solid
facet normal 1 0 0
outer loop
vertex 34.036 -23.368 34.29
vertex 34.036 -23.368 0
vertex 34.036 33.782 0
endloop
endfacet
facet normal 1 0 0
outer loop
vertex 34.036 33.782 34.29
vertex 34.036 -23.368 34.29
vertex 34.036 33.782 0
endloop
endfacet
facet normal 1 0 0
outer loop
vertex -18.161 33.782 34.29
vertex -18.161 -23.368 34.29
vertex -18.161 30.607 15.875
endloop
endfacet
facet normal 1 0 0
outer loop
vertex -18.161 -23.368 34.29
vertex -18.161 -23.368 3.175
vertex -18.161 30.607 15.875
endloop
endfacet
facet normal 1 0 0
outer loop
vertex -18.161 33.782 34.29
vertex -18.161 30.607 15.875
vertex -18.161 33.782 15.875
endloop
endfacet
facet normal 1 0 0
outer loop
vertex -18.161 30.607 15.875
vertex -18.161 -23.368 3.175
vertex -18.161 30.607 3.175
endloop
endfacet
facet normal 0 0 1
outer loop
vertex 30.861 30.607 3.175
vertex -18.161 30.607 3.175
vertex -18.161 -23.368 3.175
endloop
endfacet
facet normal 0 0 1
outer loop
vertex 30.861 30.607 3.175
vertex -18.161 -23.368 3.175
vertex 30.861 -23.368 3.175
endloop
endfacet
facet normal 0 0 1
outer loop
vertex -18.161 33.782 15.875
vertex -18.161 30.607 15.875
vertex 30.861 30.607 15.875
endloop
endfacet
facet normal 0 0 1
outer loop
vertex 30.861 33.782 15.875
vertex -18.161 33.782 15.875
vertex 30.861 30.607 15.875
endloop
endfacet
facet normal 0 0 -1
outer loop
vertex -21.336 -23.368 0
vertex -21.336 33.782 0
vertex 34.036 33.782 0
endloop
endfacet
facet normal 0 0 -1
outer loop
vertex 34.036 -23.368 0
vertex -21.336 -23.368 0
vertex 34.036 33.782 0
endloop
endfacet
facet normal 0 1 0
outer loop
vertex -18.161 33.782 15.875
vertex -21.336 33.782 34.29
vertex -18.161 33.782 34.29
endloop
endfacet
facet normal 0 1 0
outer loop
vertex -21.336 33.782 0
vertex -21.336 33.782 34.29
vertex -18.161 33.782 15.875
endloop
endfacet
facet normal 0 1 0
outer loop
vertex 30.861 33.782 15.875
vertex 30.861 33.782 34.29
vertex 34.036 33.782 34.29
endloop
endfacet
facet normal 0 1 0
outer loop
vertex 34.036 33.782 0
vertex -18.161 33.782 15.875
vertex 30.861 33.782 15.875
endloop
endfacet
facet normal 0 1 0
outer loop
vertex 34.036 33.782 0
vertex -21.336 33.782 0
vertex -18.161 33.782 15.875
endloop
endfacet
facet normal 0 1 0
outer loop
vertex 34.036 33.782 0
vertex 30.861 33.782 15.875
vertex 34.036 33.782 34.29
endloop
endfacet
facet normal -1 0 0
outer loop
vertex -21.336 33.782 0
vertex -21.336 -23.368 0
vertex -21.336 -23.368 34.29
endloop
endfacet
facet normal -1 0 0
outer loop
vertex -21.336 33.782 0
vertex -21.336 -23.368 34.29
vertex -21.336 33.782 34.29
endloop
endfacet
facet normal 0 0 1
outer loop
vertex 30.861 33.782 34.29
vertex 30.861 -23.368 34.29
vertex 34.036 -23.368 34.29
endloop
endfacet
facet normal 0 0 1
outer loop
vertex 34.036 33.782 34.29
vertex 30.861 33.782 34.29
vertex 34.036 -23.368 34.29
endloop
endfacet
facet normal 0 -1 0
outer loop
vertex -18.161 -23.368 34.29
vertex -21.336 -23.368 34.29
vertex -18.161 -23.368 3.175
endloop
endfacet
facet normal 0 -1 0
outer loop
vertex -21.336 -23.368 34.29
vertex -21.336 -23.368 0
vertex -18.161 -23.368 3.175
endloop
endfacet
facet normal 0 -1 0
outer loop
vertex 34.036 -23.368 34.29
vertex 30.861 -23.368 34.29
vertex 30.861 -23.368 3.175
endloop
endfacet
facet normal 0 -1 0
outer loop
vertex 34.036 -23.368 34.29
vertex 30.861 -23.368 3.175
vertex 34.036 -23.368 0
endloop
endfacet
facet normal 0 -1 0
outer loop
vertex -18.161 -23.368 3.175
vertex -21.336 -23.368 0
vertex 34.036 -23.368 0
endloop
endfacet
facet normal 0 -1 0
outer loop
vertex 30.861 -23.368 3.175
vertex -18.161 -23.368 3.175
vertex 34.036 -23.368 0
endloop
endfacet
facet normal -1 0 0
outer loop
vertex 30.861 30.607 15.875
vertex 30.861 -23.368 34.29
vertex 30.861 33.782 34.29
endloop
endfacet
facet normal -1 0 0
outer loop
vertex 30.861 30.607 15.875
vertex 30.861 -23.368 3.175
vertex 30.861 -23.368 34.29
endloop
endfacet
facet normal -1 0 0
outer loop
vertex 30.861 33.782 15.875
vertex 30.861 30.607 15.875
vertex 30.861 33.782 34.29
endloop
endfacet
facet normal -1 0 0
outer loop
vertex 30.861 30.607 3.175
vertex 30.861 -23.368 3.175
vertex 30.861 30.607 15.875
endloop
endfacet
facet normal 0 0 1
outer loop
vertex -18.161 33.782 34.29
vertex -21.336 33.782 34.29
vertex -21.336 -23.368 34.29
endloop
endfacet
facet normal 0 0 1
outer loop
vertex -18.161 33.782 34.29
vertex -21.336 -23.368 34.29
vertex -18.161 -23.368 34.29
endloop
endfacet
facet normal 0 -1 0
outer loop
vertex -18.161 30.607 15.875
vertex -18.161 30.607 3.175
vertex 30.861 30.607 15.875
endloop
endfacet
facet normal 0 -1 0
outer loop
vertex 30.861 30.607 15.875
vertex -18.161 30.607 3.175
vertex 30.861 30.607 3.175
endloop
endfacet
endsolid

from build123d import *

# Parameters (mm, degrees)
SKETCH1_W           = 55.372
SKETCH1_H           = 57.15
BOSS_EXTRUDE1_DEPTH = 34.29
SHELL1_T            = -3.175
CUT_EXTRUDE1_DEPTH  = 39.116


with BuildPart() as part:
    # Sketch1 → Boss-Extrude1 (new body)
    with BuildSketch(Plane.XY):
        with Locations((6.35, 5.207)):
            Rectangle(SKETCH1_W, SKETCH1_H)
    extrude(amount=BOSS_EXTRUDE1_DEPTH)

    # Shell1
    shell1_openings = [part.faces().sort_by_distance(p)[0] for p in [
        (6.35, 5.207, 34.29),
        (6.35, -23.368, 17.145),
    ]]
    offset(amount=SHELL1_T, openings=shell1_openings, kind=Kind.INTERSECTION)

    # Sketch2 → Cut-Extrude1 (cut)
    with BuildSketch(Plane.XZ.offset(-30.607)):
        Polygon((-18.161, 15.875), (10.564637788, 15.875), (30.861, 15.875), (30.861, 34.29), (-18.161, 34.29), align=None)
    extrude(amount=-CUT_EXTRUDE1_DEPTH, mode=Mode.SUBTRACT)


solid = part.part
